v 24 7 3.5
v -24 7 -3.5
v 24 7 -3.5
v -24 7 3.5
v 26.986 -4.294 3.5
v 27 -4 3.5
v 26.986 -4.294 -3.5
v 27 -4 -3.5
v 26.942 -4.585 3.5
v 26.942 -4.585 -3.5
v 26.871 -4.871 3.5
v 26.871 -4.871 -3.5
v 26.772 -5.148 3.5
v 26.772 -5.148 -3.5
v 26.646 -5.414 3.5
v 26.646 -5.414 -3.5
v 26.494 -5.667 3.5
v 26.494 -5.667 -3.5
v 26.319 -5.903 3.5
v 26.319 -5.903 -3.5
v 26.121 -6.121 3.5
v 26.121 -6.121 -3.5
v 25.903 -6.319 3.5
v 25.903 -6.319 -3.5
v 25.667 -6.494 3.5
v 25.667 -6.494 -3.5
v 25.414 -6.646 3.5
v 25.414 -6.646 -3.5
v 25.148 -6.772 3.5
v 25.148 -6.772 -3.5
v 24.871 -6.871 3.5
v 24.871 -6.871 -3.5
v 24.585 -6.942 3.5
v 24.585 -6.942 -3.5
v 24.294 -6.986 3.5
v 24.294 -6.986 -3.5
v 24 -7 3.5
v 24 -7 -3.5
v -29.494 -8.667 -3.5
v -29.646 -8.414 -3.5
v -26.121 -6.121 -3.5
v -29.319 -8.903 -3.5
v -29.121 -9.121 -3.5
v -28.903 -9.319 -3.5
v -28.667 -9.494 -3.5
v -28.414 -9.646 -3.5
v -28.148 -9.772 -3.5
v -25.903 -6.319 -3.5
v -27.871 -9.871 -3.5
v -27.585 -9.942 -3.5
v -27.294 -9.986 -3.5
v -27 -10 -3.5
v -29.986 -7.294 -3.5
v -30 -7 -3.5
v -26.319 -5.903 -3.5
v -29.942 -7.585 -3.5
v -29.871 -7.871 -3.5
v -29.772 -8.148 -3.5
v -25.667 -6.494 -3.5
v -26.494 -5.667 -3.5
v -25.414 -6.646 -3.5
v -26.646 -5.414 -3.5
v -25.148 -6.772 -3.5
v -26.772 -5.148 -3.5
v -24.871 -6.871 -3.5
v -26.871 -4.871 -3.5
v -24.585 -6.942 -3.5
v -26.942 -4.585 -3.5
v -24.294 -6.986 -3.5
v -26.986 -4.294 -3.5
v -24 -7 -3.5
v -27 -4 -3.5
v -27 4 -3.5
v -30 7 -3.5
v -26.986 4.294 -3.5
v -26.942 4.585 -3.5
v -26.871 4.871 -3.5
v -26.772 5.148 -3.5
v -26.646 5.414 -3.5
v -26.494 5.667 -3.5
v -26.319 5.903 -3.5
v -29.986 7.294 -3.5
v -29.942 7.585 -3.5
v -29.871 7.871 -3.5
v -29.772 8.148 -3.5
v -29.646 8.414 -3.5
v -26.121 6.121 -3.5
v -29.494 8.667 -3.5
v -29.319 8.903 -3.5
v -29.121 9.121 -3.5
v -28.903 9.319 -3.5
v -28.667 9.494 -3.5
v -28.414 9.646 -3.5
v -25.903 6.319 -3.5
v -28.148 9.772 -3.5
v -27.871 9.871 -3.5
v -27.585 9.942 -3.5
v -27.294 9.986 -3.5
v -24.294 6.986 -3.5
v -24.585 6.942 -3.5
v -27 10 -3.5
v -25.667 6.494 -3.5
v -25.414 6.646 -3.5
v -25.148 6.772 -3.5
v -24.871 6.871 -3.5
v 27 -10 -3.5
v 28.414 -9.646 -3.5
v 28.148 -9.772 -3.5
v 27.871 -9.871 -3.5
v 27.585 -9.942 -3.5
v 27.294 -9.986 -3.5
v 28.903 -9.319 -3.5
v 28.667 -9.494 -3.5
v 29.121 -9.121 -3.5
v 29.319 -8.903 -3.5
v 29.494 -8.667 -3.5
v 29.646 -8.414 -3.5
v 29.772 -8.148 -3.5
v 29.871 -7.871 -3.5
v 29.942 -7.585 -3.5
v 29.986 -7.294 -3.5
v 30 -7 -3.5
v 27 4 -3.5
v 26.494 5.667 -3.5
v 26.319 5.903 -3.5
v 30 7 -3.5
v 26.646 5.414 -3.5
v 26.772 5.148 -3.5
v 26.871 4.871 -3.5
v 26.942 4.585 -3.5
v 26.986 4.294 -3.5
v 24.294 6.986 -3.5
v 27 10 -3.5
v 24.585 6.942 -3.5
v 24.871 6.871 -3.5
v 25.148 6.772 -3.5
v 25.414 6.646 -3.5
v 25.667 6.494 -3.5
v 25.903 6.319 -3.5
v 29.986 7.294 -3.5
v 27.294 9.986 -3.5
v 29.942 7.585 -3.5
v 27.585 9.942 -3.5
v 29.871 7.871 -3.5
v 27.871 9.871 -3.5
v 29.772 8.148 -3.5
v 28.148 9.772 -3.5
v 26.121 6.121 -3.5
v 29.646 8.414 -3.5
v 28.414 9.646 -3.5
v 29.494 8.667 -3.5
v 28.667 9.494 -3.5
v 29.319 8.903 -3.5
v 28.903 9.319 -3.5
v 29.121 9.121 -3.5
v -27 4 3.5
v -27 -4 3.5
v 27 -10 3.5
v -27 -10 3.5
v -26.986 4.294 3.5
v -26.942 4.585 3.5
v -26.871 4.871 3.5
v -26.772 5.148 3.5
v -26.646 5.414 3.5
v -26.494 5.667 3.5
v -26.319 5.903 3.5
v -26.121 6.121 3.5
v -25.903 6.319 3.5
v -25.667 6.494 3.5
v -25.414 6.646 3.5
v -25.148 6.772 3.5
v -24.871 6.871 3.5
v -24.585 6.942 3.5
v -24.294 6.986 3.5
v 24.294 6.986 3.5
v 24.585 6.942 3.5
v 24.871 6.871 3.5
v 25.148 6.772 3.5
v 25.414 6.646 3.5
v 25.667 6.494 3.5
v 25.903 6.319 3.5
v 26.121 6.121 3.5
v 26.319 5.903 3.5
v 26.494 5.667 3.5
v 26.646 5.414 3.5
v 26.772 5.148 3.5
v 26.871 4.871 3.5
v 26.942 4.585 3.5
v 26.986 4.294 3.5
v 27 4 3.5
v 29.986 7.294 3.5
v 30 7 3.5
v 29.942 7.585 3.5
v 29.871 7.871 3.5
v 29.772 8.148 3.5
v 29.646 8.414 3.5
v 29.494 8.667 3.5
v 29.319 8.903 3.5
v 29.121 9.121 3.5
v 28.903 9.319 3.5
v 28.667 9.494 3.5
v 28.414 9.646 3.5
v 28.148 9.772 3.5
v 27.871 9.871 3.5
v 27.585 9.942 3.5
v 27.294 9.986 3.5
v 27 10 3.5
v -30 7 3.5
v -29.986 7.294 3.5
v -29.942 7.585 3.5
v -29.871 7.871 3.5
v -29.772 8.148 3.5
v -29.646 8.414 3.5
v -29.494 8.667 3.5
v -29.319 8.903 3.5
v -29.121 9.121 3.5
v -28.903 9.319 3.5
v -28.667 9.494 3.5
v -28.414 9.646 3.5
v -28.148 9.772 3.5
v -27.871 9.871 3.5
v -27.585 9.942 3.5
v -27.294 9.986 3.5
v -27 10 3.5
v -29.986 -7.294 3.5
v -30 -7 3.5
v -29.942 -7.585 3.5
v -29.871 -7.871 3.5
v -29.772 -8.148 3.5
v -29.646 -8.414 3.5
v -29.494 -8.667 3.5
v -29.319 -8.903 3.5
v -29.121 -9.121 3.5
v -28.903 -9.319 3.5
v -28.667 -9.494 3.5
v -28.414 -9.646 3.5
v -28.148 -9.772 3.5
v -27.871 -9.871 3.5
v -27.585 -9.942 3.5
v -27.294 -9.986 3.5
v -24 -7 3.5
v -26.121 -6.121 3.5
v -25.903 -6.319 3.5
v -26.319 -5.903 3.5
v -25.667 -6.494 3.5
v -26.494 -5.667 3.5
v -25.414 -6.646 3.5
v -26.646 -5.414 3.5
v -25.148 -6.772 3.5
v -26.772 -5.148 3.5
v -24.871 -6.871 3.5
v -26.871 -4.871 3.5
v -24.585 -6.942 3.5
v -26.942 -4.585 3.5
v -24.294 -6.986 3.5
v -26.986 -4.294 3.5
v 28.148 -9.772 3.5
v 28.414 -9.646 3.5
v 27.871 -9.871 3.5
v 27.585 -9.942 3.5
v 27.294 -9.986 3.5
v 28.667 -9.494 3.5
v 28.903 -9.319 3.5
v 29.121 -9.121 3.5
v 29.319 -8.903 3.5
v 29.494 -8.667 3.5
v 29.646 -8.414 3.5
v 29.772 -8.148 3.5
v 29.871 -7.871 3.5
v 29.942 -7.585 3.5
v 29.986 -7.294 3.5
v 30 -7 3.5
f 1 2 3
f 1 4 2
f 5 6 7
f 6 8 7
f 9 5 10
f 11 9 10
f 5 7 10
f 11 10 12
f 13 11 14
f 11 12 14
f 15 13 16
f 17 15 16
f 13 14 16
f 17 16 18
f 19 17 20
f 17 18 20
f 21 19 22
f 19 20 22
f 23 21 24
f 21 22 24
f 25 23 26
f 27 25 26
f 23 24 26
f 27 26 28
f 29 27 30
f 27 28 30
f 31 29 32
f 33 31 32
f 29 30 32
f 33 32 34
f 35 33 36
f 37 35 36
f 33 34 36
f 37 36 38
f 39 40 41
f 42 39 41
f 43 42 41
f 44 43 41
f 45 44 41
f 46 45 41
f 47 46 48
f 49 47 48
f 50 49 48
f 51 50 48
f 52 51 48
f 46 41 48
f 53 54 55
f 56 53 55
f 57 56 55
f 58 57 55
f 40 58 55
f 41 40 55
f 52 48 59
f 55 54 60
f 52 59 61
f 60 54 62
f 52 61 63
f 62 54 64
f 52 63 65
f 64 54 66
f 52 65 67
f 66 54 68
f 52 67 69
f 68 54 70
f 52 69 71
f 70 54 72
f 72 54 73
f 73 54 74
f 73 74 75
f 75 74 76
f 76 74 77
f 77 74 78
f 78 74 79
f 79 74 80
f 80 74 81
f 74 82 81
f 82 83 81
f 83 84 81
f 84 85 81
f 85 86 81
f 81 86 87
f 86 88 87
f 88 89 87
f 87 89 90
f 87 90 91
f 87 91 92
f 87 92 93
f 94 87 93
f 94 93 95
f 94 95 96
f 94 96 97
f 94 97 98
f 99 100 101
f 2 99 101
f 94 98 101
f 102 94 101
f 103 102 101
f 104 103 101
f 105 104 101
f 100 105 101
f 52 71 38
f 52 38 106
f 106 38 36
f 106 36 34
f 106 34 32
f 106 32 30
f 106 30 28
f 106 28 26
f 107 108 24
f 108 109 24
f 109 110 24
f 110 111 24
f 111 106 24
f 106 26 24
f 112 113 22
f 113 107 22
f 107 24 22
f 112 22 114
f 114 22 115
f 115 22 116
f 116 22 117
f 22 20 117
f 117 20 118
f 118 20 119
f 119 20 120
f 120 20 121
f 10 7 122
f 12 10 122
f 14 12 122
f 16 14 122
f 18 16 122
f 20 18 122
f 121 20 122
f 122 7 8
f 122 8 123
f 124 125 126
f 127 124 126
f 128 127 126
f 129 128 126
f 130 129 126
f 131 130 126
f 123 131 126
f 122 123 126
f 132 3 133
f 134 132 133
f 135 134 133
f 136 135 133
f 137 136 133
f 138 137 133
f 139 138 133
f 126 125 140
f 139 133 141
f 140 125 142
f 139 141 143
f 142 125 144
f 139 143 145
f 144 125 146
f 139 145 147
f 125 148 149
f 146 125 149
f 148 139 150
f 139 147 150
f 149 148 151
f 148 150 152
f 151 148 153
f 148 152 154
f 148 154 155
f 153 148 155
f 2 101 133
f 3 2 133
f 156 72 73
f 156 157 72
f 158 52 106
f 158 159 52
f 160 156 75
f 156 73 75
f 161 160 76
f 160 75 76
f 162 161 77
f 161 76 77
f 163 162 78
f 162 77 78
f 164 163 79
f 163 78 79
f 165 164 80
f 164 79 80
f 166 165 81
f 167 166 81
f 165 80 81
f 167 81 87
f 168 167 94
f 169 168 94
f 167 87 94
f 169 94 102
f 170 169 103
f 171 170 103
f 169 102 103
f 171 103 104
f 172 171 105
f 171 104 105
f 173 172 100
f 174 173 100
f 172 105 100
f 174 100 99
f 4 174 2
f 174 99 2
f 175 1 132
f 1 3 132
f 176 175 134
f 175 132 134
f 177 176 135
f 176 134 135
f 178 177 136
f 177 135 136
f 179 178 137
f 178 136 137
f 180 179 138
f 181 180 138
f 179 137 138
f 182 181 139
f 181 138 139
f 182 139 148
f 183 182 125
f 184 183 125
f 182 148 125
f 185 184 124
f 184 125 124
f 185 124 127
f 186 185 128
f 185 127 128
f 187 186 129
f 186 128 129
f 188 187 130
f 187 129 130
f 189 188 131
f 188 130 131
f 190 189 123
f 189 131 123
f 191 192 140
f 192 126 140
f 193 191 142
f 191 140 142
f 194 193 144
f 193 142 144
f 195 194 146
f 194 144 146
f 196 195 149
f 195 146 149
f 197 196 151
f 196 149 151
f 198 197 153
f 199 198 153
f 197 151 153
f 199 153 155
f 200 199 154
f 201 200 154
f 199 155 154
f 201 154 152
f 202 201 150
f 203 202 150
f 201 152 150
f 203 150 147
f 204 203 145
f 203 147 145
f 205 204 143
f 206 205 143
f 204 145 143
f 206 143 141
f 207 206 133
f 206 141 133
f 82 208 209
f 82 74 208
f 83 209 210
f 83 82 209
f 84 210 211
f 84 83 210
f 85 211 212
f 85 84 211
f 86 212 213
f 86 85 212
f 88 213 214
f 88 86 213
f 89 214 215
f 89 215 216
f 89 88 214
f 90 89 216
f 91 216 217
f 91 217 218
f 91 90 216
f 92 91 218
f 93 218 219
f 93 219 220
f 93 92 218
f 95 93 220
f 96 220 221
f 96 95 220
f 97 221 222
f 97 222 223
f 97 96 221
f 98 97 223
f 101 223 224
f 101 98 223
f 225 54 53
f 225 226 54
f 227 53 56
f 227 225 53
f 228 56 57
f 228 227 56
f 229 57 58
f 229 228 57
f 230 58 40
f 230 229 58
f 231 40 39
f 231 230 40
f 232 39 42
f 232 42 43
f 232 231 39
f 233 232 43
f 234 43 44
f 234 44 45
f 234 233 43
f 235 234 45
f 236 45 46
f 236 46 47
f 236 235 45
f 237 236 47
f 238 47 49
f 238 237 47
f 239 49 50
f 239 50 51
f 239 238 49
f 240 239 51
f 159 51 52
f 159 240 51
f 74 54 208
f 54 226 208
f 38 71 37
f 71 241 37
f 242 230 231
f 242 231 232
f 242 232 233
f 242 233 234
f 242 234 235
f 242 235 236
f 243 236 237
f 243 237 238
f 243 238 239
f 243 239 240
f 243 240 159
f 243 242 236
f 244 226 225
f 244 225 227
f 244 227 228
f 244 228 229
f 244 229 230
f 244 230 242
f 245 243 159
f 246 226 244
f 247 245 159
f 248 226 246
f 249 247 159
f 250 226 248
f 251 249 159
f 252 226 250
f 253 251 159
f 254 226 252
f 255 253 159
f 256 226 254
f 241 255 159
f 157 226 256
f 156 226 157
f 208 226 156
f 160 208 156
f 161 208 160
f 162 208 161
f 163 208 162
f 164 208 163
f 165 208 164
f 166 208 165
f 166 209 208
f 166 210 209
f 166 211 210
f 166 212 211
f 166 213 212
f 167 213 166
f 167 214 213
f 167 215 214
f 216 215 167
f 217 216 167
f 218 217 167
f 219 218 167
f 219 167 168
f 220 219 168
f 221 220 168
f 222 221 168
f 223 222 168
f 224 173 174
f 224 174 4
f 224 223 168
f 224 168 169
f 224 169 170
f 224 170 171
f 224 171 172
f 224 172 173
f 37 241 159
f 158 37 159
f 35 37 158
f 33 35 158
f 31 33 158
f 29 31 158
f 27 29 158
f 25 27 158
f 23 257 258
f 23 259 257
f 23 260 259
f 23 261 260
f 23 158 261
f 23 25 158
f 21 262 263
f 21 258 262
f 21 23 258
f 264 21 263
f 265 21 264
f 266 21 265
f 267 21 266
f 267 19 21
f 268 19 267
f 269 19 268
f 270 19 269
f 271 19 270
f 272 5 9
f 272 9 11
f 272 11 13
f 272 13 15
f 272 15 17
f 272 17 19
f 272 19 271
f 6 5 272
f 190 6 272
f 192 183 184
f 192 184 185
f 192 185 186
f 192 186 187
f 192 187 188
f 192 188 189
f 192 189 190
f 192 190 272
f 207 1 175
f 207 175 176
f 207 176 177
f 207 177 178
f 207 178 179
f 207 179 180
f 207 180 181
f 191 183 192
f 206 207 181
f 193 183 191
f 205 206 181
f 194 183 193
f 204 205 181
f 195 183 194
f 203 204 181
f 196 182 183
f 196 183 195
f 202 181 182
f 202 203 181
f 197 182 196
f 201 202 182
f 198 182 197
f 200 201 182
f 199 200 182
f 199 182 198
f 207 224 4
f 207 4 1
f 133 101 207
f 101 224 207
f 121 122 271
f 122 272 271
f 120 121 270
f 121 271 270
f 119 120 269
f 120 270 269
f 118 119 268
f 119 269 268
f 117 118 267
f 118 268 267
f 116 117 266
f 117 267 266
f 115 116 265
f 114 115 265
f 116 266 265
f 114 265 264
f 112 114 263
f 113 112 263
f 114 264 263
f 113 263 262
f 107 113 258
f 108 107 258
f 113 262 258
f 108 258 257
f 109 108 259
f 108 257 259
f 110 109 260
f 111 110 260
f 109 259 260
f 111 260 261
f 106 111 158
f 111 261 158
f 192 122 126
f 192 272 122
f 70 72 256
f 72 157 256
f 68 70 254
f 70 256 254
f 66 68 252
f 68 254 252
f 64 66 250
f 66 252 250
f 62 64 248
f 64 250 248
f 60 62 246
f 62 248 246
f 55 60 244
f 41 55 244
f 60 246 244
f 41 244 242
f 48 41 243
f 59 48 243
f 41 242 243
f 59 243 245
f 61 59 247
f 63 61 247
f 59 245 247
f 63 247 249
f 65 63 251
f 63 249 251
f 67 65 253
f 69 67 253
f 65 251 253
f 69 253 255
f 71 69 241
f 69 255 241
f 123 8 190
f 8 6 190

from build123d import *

# Parameters (mm, degrees)
F0_W     = 60
F0_H     = 20
F0_W_2   = 54
F0_H_2   = 14
F1_DEPTH = 3.5
F2_R     = 3


with BuildPart() as f1:
    # F0 (on Top) → F1 (new body, symmetric)
    with BuildSketch(Plane.XY):
        Rectangle(F0_W, F0_H)
        Rectangle(F0_W_2, F0_H_2, mode=Mode.SUBTRACT)
    extrude(amount=F1_DEPTH, both=True)

    # F2
    f2_edges = [f1.edges().sort_by_distance(p)[0] for p in [
        (-30, -10, 0),
        (-30, 10, 0),
        (-27, 7, 0),
        (-27, -7, 0),
        (27, 7, 0),
        (27, -7, 0),
        (30, 10, 0),
        (30, -10, 0),
    ]]
    fillet(f2_edges, radius=F2_R)


solid = f1.part
